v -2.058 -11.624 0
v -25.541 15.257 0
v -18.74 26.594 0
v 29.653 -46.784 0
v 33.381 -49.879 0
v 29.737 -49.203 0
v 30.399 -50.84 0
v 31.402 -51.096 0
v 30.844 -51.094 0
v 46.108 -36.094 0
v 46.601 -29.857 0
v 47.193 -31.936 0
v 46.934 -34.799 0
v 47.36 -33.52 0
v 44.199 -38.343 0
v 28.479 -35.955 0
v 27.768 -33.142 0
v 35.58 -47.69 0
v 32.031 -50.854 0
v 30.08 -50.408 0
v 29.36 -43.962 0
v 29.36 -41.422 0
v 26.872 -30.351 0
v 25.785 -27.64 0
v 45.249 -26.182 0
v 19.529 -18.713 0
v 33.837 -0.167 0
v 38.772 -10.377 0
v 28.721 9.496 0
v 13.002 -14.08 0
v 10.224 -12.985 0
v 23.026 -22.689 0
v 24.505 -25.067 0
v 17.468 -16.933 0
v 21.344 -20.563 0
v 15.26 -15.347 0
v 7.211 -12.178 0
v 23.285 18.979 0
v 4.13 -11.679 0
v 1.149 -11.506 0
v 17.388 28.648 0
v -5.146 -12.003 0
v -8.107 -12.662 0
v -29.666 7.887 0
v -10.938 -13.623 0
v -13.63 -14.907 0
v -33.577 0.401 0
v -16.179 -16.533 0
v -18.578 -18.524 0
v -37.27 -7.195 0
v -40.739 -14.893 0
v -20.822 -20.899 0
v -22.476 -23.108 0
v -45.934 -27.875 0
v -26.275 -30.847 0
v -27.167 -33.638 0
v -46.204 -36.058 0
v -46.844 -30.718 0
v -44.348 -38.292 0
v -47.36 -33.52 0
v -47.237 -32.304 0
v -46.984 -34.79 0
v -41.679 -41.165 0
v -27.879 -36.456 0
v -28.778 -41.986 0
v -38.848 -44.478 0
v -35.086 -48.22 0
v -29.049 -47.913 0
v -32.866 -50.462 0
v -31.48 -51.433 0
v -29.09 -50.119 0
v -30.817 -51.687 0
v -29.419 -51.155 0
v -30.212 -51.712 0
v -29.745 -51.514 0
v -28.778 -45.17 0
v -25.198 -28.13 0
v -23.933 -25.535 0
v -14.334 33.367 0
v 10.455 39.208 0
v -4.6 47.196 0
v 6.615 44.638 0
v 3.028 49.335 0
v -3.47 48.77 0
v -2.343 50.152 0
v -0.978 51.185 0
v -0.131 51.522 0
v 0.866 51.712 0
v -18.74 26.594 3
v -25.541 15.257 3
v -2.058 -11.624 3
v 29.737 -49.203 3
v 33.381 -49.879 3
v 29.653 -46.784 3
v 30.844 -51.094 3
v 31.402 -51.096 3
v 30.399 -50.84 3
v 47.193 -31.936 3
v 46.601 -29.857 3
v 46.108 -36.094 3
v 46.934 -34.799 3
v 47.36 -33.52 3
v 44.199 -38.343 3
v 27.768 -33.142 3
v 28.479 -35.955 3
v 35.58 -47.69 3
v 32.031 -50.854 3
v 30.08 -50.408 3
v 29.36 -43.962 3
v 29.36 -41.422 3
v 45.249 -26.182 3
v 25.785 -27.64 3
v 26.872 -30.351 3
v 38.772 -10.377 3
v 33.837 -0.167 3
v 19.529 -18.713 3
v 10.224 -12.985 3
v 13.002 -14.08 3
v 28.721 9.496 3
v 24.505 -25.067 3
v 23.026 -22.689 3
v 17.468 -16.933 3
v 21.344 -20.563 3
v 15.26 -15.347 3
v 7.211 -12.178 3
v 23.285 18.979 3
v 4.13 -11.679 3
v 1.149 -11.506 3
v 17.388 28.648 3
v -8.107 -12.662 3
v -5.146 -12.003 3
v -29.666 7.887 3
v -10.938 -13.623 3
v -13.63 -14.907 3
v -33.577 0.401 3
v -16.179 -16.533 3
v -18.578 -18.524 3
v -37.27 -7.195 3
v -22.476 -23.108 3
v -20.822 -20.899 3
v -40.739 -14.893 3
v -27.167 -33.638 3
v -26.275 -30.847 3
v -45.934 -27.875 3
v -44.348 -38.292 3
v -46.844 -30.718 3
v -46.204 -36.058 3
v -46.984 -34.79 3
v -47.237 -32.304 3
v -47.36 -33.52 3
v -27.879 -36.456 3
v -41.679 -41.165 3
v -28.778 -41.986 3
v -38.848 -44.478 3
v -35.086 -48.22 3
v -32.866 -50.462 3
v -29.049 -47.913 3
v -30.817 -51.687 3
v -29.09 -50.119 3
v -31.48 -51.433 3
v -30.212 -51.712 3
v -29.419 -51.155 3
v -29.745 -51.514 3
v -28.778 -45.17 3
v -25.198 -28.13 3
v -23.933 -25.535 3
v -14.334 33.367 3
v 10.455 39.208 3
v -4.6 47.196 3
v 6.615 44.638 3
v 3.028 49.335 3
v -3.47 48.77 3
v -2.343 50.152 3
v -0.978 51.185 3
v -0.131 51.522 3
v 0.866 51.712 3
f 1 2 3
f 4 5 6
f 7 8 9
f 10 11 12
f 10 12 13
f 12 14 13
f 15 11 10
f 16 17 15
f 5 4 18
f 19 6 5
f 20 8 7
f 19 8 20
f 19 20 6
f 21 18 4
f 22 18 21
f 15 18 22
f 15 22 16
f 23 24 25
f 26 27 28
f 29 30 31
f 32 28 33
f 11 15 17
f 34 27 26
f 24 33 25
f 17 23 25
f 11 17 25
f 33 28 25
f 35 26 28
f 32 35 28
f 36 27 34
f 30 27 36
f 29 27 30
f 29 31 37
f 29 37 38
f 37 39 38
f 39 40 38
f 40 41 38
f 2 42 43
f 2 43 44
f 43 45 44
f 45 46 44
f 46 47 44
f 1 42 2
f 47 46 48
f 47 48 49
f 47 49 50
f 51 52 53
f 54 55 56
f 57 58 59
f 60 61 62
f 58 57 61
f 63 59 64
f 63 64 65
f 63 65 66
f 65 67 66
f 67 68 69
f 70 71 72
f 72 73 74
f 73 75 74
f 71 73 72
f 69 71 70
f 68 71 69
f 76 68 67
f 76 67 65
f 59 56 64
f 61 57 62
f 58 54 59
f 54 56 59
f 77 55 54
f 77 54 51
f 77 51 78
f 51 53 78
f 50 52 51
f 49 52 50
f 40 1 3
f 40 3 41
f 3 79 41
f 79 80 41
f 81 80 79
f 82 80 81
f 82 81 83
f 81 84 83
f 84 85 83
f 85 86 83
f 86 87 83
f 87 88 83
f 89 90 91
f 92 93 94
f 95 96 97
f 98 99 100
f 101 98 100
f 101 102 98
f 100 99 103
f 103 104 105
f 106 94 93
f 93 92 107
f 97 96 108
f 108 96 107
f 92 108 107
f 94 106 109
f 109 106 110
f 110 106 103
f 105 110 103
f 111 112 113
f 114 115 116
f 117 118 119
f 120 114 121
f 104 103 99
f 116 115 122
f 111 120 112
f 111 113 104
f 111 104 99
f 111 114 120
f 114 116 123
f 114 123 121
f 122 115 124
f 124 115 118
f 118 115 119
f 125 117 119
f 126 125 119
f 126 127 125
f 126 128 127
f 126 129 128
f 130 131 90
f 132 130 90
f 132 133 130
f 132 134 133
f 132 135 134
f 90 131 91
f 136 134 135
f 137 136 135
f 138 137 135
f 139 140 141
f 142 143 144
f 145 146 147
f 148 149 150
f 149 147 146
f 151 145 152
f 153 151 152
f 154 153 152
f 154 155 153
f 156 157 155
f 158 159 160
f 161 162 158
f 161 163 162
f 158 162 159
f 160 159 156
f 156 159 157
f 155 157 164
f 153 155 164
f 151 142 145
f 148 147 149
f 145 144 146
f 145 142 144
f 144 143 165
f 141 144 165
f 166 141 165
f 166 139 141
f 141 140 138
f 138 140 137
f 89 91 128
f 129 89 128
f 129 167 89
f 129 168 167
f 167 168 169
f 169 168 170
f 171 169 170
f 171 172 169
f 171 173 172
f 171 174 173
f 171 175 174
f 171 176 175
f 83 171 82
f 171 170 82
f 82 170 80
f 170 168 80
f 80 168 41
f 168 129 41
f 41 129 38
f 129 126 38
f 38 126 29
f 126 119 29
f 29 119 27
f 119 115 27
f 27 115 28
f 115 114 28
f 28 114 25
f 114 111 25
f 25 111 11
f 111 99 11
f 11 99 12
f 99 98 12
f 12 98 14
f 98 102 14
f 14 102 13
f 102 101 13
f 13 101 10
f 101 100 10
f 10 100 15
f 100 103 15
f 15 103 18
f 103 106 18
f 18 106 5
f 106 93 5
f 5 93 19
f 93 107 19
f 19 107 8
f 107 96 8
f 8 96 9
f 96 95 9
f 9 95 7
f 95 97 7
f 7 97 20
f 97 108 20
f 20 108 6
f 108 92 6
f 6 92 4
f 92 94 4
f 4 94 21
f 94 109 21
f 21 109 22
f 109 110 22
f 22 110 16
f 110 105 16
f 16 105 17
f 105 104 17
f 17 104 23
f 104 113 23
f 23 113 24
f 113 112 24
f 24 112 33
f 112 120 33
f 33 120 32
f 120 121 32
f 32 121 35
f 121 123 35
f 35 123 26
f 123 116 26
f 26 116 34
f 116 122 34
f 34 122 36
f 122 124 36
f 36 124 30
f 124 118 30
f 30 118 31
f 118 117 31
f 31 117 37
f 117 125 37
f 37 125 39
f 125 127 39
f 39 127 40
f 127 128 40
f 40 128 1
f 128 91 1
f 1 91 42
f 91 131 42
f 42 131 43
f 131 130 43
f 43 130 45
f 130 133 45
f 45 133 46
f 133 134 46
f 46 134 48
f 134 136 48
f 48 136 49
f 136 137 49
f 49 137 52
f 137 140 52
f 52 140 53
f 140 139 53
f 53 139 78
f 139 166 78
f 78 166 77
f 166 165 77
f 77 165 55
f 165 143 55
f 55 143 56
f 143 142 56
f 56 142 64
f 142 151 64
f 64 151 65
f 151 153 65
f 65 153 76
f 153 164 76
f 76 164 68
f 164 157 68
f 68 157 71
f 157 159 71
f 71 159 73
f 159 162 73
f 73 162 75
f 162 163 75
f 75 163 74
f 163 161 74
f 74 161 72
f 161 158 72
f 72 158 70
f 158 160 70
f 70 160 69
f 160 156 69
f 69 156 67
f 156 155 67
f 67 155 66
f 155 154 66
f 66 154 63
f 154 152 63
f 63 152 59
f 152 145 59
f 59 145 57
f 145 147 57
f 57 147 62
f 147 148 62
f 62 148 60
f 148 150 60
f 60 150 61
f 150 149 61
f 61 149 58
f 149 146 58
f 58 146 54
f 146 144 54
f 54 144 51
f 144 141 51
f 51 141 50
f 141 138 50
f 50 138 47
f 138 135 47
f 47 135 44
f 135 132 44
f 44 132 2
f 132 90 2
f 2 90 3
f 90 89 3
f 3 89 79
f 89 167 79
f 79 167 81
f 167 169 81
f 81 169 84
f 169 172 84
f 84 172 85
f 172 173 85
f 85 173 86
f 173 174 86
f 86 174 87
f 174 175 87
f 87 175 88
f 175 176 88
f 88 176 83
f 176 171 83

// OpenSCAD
// Module names are of the form poly_<inkscape-path-id>().  As a result,
// you can associate a polygon in this OpenSCAD program with the corresponding
// SVG element in the Inkscape document by looking for the XML element with
// the attribute id="inkscape-path-id".

// fudge value is used to ensure that subtracted solids are a tad taller
// in the z dimension than the polygon being subtracted from.  This helps
// keep the resulting .stl file manifold.
fudge = 0.1;

module aquaman(h)
{
  scale([25.4/90, -25.4/90, 1]) union()
  {
    linear_extrude(height=h)
      polygon([[10.730000,-174.810000],[23.440156,-158.167813],[37.043750,-138.925000],[61.610000,-101.510000],[82.505313,-67.248906],[101.767500,-33.648750],[119.893438,0.590781],[137.380000,36.770000],[160.330000,92.770000],[165.120000,105.792500],[167.220625,113.160625],[167.810000,118.770000],[166.300469,123.302187],[163.376250,127.892500],[156.610000,135.860000],[126.070000,168.980000],[118.280000,176.735000],[113.495313,180.190625],[111.265273,181.050078],[109.290000,181.040000],[107.712090,180.141875],[106.581719,178.611875],[105.368750,174.342500],[105.070000,165.770000],[104.030000,155.770000],[104.030000,146.770000],[100.908750,127.400000],[98.390938,117.430703],[95.215000,107.542500],[91.365938,97.938359],[86.828750,88.821250],[81.588437,80.394141],[75.630000,72.860000],[69.198594,66.305156],[61.896250,59.998750],[54.070781,54.380469],[46.070000,49.890000],[36.225313,46.008281],[25.550000,43.151250],[14.634687,41.383594],[4.070000,40.770000],[-7.293672,41.188145],[-18.233125,42.528906],[-28.727266,44.865527],[-38.755000,48.271250],[-48.295234,52.819316],[-57.326875,58.582969],[-65.828828,65.635449],[-73.780000,74.050000],[-79.637949,81.880215],[-84.801094,90.476719],[-89.283379,99.672051],[-93.098750,109.298750],[-96.261152,119.189355],[-98.784531,129.176406],[-101.970000,148.770000],[-101.970000,160.050000],[-102.930000,169.770000],[-103.073750,177.587500],[-104.239219,181.259063],[-105.395996,182.529414],[-107.050000,183.230000],[-109.195215,183.141855],[-111.544219,182.243594],[-116.453750,178.803750],[-124.320000,170.860000],[-137.650000,157.600000],[-147.680000,145.860000],[-157.140000,135.680000],[-163.716250,127.765000],[-166.478906,123.271250],[-167.810000,118.770000],[-167.375313,114.463750],[-165.982500,108.845000],[-162.760000,98.770000],[-144.350000,52.770000],[-132.058906,25.492969],[-118.973750,-1.421250],[-105.114219,-27.947344],[-90.500000,-54.060000],[-66.400000,-94.230000],[-50.790000,-118.230000],[-16.300000,-167.230000],[-12.294688,-172.806875],[-8.302500,-177.705000],[-3.466563,-181.365625],[-0.464414,-182.557266],[3.070000,-183.230000],[10.730000,-174.810000]]);
  }
}

aquaman(3);
